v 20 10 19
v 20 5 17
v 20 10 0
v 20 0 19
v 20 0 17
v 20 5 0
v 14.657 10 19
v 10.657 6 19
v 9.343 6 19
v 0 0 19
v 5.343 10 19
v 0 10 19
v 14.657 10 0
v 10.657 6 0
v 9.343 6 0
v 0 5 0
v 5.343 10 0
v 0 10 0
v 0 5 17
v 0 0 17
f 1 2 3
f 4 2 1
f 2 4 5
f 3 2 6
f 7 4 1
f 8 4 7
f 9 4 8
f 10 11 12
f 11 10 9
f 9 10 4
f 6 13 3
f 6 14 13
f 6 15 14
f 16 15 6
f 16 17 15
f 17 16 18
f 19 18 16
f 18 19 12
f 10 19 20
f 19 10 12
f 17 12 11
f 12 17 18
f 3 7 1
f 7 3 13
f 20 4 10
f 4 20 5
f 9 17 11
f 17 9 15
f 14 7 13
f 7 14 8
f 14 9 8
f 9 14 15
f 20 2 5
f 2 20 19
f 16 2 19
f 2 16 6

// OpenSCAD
// vice jaws to hold tubes
module jaw() {
    difference(){
        union(){
            difference(){
                cube([20, 10, 19]);
                translate([10, 11, 10]) rotate([0,0,45]) cube([8, 8, 20], true);
            }
            cube([20, 6, 19]);
        }
        translate([0, -5, -2]) cube([20, 10, 19]);
    }
}

jaw();
//translate([10,11,0]) cylinder(r=4,h=20);
//translate([10,12.5,0]) cylinder(r=5,h=20);
